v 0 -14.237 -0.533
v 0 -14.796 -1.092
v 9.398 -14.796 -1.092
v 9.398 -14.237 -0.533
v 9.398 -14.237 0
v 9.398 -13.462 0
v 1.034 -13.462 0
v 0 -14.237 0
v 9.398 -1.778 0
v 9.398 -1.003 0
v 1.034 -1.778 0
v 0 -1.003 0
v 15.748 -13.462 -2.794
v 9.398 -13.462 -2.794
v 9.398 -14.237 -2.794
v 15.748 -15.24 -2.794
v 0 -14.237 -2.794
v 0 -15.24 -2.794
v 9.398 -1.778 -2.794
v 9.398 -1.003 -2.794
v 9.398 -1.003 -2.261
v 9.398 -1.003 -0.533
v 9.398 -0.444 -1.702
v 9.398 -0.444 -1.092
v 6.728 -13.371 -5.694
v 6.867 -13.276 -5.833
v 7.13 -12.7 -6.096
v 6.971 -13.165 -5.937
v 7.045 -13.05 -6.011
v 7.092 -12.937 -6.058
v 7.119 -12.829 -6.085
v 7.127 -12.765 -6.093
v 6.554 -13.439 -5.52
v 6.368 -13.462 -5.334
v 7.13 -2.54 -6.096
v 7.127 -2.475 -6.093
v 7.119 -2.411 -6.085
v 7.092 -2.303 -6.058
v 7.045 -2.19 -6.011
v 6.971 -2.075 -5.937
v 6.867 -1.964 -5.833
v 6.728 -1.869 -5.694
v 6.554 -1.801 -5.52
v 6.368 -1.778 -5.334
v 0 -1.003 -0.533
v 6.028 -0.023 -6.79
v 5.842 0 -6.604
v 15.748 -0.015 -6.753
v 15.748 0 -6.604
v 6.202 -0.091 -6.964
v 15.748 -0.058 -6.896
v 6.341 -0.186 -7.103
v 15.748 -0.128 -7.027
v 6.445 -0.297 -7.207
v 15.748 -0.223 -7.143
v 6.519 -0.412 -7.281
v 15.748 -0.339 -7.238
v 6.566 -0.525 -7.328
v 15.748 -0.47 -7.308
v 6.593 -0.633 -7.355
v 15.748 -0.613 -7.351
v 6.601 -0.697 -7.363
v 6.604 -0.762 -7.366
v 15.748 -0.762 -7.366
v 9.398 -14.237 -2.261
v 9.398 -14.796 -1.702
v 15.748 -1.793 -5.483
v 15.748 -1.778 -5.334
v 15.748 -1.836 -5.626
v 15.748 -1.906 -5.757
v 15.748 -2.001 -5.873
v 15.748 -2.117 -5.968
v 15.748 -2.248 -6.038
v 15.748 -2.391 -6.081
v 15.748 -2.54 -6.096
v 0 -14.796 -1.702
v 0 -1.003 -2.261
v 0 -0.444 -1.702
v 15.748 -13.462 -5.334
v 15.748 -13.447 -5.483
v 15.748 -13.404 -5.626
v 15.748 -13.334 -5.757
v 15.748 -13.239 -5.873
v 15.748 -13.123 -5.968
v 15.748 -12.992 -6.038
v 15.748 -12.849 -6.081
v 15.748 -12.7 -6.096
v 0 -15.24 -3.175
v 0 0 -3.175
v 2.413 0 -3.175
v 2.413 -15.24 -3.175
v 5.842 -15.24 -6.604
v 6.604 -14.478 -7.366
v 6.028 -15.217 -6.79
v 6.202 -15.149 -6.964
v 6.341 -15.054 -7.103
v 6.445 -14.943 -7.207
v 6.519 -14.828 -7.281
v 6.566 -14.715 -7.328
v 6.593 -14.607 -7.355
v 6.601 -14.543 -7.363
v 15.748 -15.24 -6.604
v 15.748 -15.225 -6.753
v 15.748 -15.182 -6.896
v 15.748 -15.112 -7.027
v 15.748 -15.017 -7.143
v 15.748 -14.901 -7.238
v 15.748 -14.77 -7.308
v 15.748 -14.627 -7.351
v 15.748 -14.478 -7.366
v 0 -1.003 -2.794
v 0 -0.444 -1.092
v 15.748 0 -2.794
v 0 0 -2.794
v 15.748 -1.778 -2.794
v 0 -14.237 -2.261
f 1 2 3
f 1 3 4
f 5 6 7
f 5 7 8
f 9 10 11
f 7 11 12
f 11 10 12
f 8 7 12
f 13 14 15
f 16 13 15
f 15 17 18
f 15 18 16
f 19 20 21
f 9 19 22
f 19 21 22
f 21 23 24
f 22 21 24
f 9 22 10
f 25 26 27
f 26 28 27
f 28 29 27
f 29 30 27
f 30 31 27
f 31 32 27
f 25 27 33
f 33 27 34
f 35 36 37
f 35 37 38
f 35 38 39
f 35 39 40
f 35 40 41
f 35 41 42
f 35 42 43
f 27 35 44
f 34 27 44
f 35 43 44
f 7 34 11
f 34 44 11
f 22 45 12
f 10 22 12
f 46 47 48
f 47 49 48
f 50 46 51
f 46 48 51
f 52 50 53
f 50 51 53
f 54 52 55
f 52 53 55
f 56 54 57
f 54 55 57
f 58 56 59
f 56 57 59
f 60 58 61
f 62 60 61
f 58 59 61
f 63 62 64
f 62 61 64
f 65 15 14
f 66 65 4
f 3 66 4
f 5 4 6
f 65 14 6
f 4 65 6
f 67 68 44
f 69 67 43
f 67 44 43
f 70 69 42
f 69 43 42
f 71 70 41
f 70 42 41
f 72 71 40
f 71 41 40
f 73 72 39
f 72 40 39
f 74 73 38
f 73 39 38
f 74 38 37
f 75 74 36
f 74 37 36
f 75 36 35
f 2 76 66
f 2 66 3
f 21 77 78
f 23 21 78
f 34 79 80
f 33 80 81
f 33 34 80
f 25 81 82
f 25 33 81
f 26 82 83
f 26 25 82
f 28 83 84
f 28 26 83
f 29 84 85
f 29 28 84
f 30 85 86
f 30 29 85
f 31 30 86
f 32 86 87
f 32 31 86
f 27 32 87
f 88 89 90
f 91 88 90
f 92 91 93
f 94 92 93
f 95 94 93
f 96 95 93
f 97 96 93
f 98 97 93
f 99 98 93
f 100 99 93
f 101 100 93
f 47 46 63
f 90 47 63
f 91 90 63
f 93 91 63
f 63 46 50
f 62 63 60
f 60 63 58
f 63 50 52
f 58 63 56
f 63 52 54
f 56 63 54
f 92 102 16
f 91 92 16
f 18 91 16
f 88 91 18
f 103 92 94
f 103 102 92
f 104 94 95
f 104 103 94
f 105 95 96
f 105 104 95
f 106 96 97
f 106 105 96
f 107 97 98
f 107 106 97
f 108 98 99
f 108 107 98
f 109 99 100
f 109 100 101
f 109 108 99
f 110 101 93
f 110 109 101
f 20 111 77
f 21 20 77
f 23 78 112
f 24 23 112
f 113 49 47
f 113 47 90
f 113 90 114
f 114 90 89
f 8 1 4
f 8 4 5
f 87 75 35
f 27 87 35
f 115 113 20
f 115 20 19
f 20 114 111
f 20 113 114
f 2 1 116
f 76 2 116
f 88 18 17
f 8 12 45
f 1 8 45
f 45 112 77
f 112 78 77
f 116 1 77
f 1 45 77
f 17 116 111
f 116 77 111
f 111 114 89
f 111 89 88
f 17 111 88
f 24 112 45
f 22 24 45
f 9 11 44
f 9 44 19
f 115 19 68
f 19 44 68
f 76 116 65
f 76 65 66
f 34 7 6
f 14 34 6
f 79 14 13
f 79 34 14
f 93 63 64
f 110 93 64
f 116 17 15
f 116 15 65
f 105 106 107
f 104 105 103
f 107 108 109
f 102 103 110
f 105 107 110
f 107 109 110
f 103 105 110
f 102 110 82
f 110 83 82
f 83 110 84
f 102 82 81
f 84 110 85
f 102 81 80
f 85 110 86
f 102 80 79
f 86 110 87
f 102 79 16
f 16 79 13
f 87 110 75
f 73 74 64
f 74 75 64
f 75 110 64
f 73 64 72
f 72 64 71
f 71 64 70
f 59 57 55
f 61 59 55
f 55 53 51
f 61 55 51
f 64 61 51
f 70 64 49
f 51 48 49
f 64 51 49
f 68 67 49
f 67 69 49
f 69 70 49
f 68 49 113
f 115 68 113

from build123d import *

# Parameters (mm, degrees)
BOSS_EXTRUDE1_DEPTH = 15.24
CUT_EXTRUDE1_DEPTH  = 16.748
CUT_EXTRUDE2_DEPTH  = 5.842
FILLET1_R           = 0.762


with BuildPart() as part:
    # Sketch1 → Boss-Extrude1 (new body)
    with BuildSketch(Plane(origin=(0, 0, 0), x_dir=(1, 0, 0), z_dir=(0, 1, 0))):
        Polygon((0, 0), (0, 3.175), (2.413, 3.175), (6.604, 7.366), (15.748, 7.366), (15.748, 2.794), (9.398, 2.794), (9.398, 0), align=None)
    extrude(amount=-BOSS_EXTRUDE1_DEPTH)

    # Sketch5 → Cut-Extrude1 (cut, through all)
    with BuildSketch(Plane.ZY):
        Polygon((0, -1.0033), (0, 0), (-2.794, 0), (-2.794, -1.0033), (-2.2606, -1.0033), (-1.7018, -0.4445), (-1.0922, -0.4445), (-0.5334, -1.0033), align=None)
    cut_extrude1 = extrude(amount=-CUT_EXTRUDE1_DEPTH, mode=Mode.SUBTRACT)

    # Mirror1: Cut-Extrude1 across plane
    add(cut_extrude1.mirror(Plane.ZX.offset(-7.62)), mode=Mode.SUBTRACT)

    # Sketch6 → Cut-Extrude2 (cut, symmetric)
    with BuildSketch(Plane(origin=(0, -7.62, 0), x_dir=(1, 0, 0), z_dir=(0, 1, 0))):
        Polygon((15.748, 6.096), (7.130051224, 6.096), (1.034051224, 0), (15.748, 0), align=None)
    extrude(amount=CUT_EXTRUDE2_DEPTH, both=True, mode=Mode.SUBTRACT)

    # Fillet1
    fillet1_edges = [part.edges().sort_by_distance(p)[0] for p in [
        (11.439025612, -13.462, -6.096),
        (11.439025612, -1.778, -6.096),
        (11.176, -15.24, -7.366),
        (11.176, 0, -7.366),
    ]]
    fillet(fillet1_edges, radius=FILLET1_R)


solid = part.part
